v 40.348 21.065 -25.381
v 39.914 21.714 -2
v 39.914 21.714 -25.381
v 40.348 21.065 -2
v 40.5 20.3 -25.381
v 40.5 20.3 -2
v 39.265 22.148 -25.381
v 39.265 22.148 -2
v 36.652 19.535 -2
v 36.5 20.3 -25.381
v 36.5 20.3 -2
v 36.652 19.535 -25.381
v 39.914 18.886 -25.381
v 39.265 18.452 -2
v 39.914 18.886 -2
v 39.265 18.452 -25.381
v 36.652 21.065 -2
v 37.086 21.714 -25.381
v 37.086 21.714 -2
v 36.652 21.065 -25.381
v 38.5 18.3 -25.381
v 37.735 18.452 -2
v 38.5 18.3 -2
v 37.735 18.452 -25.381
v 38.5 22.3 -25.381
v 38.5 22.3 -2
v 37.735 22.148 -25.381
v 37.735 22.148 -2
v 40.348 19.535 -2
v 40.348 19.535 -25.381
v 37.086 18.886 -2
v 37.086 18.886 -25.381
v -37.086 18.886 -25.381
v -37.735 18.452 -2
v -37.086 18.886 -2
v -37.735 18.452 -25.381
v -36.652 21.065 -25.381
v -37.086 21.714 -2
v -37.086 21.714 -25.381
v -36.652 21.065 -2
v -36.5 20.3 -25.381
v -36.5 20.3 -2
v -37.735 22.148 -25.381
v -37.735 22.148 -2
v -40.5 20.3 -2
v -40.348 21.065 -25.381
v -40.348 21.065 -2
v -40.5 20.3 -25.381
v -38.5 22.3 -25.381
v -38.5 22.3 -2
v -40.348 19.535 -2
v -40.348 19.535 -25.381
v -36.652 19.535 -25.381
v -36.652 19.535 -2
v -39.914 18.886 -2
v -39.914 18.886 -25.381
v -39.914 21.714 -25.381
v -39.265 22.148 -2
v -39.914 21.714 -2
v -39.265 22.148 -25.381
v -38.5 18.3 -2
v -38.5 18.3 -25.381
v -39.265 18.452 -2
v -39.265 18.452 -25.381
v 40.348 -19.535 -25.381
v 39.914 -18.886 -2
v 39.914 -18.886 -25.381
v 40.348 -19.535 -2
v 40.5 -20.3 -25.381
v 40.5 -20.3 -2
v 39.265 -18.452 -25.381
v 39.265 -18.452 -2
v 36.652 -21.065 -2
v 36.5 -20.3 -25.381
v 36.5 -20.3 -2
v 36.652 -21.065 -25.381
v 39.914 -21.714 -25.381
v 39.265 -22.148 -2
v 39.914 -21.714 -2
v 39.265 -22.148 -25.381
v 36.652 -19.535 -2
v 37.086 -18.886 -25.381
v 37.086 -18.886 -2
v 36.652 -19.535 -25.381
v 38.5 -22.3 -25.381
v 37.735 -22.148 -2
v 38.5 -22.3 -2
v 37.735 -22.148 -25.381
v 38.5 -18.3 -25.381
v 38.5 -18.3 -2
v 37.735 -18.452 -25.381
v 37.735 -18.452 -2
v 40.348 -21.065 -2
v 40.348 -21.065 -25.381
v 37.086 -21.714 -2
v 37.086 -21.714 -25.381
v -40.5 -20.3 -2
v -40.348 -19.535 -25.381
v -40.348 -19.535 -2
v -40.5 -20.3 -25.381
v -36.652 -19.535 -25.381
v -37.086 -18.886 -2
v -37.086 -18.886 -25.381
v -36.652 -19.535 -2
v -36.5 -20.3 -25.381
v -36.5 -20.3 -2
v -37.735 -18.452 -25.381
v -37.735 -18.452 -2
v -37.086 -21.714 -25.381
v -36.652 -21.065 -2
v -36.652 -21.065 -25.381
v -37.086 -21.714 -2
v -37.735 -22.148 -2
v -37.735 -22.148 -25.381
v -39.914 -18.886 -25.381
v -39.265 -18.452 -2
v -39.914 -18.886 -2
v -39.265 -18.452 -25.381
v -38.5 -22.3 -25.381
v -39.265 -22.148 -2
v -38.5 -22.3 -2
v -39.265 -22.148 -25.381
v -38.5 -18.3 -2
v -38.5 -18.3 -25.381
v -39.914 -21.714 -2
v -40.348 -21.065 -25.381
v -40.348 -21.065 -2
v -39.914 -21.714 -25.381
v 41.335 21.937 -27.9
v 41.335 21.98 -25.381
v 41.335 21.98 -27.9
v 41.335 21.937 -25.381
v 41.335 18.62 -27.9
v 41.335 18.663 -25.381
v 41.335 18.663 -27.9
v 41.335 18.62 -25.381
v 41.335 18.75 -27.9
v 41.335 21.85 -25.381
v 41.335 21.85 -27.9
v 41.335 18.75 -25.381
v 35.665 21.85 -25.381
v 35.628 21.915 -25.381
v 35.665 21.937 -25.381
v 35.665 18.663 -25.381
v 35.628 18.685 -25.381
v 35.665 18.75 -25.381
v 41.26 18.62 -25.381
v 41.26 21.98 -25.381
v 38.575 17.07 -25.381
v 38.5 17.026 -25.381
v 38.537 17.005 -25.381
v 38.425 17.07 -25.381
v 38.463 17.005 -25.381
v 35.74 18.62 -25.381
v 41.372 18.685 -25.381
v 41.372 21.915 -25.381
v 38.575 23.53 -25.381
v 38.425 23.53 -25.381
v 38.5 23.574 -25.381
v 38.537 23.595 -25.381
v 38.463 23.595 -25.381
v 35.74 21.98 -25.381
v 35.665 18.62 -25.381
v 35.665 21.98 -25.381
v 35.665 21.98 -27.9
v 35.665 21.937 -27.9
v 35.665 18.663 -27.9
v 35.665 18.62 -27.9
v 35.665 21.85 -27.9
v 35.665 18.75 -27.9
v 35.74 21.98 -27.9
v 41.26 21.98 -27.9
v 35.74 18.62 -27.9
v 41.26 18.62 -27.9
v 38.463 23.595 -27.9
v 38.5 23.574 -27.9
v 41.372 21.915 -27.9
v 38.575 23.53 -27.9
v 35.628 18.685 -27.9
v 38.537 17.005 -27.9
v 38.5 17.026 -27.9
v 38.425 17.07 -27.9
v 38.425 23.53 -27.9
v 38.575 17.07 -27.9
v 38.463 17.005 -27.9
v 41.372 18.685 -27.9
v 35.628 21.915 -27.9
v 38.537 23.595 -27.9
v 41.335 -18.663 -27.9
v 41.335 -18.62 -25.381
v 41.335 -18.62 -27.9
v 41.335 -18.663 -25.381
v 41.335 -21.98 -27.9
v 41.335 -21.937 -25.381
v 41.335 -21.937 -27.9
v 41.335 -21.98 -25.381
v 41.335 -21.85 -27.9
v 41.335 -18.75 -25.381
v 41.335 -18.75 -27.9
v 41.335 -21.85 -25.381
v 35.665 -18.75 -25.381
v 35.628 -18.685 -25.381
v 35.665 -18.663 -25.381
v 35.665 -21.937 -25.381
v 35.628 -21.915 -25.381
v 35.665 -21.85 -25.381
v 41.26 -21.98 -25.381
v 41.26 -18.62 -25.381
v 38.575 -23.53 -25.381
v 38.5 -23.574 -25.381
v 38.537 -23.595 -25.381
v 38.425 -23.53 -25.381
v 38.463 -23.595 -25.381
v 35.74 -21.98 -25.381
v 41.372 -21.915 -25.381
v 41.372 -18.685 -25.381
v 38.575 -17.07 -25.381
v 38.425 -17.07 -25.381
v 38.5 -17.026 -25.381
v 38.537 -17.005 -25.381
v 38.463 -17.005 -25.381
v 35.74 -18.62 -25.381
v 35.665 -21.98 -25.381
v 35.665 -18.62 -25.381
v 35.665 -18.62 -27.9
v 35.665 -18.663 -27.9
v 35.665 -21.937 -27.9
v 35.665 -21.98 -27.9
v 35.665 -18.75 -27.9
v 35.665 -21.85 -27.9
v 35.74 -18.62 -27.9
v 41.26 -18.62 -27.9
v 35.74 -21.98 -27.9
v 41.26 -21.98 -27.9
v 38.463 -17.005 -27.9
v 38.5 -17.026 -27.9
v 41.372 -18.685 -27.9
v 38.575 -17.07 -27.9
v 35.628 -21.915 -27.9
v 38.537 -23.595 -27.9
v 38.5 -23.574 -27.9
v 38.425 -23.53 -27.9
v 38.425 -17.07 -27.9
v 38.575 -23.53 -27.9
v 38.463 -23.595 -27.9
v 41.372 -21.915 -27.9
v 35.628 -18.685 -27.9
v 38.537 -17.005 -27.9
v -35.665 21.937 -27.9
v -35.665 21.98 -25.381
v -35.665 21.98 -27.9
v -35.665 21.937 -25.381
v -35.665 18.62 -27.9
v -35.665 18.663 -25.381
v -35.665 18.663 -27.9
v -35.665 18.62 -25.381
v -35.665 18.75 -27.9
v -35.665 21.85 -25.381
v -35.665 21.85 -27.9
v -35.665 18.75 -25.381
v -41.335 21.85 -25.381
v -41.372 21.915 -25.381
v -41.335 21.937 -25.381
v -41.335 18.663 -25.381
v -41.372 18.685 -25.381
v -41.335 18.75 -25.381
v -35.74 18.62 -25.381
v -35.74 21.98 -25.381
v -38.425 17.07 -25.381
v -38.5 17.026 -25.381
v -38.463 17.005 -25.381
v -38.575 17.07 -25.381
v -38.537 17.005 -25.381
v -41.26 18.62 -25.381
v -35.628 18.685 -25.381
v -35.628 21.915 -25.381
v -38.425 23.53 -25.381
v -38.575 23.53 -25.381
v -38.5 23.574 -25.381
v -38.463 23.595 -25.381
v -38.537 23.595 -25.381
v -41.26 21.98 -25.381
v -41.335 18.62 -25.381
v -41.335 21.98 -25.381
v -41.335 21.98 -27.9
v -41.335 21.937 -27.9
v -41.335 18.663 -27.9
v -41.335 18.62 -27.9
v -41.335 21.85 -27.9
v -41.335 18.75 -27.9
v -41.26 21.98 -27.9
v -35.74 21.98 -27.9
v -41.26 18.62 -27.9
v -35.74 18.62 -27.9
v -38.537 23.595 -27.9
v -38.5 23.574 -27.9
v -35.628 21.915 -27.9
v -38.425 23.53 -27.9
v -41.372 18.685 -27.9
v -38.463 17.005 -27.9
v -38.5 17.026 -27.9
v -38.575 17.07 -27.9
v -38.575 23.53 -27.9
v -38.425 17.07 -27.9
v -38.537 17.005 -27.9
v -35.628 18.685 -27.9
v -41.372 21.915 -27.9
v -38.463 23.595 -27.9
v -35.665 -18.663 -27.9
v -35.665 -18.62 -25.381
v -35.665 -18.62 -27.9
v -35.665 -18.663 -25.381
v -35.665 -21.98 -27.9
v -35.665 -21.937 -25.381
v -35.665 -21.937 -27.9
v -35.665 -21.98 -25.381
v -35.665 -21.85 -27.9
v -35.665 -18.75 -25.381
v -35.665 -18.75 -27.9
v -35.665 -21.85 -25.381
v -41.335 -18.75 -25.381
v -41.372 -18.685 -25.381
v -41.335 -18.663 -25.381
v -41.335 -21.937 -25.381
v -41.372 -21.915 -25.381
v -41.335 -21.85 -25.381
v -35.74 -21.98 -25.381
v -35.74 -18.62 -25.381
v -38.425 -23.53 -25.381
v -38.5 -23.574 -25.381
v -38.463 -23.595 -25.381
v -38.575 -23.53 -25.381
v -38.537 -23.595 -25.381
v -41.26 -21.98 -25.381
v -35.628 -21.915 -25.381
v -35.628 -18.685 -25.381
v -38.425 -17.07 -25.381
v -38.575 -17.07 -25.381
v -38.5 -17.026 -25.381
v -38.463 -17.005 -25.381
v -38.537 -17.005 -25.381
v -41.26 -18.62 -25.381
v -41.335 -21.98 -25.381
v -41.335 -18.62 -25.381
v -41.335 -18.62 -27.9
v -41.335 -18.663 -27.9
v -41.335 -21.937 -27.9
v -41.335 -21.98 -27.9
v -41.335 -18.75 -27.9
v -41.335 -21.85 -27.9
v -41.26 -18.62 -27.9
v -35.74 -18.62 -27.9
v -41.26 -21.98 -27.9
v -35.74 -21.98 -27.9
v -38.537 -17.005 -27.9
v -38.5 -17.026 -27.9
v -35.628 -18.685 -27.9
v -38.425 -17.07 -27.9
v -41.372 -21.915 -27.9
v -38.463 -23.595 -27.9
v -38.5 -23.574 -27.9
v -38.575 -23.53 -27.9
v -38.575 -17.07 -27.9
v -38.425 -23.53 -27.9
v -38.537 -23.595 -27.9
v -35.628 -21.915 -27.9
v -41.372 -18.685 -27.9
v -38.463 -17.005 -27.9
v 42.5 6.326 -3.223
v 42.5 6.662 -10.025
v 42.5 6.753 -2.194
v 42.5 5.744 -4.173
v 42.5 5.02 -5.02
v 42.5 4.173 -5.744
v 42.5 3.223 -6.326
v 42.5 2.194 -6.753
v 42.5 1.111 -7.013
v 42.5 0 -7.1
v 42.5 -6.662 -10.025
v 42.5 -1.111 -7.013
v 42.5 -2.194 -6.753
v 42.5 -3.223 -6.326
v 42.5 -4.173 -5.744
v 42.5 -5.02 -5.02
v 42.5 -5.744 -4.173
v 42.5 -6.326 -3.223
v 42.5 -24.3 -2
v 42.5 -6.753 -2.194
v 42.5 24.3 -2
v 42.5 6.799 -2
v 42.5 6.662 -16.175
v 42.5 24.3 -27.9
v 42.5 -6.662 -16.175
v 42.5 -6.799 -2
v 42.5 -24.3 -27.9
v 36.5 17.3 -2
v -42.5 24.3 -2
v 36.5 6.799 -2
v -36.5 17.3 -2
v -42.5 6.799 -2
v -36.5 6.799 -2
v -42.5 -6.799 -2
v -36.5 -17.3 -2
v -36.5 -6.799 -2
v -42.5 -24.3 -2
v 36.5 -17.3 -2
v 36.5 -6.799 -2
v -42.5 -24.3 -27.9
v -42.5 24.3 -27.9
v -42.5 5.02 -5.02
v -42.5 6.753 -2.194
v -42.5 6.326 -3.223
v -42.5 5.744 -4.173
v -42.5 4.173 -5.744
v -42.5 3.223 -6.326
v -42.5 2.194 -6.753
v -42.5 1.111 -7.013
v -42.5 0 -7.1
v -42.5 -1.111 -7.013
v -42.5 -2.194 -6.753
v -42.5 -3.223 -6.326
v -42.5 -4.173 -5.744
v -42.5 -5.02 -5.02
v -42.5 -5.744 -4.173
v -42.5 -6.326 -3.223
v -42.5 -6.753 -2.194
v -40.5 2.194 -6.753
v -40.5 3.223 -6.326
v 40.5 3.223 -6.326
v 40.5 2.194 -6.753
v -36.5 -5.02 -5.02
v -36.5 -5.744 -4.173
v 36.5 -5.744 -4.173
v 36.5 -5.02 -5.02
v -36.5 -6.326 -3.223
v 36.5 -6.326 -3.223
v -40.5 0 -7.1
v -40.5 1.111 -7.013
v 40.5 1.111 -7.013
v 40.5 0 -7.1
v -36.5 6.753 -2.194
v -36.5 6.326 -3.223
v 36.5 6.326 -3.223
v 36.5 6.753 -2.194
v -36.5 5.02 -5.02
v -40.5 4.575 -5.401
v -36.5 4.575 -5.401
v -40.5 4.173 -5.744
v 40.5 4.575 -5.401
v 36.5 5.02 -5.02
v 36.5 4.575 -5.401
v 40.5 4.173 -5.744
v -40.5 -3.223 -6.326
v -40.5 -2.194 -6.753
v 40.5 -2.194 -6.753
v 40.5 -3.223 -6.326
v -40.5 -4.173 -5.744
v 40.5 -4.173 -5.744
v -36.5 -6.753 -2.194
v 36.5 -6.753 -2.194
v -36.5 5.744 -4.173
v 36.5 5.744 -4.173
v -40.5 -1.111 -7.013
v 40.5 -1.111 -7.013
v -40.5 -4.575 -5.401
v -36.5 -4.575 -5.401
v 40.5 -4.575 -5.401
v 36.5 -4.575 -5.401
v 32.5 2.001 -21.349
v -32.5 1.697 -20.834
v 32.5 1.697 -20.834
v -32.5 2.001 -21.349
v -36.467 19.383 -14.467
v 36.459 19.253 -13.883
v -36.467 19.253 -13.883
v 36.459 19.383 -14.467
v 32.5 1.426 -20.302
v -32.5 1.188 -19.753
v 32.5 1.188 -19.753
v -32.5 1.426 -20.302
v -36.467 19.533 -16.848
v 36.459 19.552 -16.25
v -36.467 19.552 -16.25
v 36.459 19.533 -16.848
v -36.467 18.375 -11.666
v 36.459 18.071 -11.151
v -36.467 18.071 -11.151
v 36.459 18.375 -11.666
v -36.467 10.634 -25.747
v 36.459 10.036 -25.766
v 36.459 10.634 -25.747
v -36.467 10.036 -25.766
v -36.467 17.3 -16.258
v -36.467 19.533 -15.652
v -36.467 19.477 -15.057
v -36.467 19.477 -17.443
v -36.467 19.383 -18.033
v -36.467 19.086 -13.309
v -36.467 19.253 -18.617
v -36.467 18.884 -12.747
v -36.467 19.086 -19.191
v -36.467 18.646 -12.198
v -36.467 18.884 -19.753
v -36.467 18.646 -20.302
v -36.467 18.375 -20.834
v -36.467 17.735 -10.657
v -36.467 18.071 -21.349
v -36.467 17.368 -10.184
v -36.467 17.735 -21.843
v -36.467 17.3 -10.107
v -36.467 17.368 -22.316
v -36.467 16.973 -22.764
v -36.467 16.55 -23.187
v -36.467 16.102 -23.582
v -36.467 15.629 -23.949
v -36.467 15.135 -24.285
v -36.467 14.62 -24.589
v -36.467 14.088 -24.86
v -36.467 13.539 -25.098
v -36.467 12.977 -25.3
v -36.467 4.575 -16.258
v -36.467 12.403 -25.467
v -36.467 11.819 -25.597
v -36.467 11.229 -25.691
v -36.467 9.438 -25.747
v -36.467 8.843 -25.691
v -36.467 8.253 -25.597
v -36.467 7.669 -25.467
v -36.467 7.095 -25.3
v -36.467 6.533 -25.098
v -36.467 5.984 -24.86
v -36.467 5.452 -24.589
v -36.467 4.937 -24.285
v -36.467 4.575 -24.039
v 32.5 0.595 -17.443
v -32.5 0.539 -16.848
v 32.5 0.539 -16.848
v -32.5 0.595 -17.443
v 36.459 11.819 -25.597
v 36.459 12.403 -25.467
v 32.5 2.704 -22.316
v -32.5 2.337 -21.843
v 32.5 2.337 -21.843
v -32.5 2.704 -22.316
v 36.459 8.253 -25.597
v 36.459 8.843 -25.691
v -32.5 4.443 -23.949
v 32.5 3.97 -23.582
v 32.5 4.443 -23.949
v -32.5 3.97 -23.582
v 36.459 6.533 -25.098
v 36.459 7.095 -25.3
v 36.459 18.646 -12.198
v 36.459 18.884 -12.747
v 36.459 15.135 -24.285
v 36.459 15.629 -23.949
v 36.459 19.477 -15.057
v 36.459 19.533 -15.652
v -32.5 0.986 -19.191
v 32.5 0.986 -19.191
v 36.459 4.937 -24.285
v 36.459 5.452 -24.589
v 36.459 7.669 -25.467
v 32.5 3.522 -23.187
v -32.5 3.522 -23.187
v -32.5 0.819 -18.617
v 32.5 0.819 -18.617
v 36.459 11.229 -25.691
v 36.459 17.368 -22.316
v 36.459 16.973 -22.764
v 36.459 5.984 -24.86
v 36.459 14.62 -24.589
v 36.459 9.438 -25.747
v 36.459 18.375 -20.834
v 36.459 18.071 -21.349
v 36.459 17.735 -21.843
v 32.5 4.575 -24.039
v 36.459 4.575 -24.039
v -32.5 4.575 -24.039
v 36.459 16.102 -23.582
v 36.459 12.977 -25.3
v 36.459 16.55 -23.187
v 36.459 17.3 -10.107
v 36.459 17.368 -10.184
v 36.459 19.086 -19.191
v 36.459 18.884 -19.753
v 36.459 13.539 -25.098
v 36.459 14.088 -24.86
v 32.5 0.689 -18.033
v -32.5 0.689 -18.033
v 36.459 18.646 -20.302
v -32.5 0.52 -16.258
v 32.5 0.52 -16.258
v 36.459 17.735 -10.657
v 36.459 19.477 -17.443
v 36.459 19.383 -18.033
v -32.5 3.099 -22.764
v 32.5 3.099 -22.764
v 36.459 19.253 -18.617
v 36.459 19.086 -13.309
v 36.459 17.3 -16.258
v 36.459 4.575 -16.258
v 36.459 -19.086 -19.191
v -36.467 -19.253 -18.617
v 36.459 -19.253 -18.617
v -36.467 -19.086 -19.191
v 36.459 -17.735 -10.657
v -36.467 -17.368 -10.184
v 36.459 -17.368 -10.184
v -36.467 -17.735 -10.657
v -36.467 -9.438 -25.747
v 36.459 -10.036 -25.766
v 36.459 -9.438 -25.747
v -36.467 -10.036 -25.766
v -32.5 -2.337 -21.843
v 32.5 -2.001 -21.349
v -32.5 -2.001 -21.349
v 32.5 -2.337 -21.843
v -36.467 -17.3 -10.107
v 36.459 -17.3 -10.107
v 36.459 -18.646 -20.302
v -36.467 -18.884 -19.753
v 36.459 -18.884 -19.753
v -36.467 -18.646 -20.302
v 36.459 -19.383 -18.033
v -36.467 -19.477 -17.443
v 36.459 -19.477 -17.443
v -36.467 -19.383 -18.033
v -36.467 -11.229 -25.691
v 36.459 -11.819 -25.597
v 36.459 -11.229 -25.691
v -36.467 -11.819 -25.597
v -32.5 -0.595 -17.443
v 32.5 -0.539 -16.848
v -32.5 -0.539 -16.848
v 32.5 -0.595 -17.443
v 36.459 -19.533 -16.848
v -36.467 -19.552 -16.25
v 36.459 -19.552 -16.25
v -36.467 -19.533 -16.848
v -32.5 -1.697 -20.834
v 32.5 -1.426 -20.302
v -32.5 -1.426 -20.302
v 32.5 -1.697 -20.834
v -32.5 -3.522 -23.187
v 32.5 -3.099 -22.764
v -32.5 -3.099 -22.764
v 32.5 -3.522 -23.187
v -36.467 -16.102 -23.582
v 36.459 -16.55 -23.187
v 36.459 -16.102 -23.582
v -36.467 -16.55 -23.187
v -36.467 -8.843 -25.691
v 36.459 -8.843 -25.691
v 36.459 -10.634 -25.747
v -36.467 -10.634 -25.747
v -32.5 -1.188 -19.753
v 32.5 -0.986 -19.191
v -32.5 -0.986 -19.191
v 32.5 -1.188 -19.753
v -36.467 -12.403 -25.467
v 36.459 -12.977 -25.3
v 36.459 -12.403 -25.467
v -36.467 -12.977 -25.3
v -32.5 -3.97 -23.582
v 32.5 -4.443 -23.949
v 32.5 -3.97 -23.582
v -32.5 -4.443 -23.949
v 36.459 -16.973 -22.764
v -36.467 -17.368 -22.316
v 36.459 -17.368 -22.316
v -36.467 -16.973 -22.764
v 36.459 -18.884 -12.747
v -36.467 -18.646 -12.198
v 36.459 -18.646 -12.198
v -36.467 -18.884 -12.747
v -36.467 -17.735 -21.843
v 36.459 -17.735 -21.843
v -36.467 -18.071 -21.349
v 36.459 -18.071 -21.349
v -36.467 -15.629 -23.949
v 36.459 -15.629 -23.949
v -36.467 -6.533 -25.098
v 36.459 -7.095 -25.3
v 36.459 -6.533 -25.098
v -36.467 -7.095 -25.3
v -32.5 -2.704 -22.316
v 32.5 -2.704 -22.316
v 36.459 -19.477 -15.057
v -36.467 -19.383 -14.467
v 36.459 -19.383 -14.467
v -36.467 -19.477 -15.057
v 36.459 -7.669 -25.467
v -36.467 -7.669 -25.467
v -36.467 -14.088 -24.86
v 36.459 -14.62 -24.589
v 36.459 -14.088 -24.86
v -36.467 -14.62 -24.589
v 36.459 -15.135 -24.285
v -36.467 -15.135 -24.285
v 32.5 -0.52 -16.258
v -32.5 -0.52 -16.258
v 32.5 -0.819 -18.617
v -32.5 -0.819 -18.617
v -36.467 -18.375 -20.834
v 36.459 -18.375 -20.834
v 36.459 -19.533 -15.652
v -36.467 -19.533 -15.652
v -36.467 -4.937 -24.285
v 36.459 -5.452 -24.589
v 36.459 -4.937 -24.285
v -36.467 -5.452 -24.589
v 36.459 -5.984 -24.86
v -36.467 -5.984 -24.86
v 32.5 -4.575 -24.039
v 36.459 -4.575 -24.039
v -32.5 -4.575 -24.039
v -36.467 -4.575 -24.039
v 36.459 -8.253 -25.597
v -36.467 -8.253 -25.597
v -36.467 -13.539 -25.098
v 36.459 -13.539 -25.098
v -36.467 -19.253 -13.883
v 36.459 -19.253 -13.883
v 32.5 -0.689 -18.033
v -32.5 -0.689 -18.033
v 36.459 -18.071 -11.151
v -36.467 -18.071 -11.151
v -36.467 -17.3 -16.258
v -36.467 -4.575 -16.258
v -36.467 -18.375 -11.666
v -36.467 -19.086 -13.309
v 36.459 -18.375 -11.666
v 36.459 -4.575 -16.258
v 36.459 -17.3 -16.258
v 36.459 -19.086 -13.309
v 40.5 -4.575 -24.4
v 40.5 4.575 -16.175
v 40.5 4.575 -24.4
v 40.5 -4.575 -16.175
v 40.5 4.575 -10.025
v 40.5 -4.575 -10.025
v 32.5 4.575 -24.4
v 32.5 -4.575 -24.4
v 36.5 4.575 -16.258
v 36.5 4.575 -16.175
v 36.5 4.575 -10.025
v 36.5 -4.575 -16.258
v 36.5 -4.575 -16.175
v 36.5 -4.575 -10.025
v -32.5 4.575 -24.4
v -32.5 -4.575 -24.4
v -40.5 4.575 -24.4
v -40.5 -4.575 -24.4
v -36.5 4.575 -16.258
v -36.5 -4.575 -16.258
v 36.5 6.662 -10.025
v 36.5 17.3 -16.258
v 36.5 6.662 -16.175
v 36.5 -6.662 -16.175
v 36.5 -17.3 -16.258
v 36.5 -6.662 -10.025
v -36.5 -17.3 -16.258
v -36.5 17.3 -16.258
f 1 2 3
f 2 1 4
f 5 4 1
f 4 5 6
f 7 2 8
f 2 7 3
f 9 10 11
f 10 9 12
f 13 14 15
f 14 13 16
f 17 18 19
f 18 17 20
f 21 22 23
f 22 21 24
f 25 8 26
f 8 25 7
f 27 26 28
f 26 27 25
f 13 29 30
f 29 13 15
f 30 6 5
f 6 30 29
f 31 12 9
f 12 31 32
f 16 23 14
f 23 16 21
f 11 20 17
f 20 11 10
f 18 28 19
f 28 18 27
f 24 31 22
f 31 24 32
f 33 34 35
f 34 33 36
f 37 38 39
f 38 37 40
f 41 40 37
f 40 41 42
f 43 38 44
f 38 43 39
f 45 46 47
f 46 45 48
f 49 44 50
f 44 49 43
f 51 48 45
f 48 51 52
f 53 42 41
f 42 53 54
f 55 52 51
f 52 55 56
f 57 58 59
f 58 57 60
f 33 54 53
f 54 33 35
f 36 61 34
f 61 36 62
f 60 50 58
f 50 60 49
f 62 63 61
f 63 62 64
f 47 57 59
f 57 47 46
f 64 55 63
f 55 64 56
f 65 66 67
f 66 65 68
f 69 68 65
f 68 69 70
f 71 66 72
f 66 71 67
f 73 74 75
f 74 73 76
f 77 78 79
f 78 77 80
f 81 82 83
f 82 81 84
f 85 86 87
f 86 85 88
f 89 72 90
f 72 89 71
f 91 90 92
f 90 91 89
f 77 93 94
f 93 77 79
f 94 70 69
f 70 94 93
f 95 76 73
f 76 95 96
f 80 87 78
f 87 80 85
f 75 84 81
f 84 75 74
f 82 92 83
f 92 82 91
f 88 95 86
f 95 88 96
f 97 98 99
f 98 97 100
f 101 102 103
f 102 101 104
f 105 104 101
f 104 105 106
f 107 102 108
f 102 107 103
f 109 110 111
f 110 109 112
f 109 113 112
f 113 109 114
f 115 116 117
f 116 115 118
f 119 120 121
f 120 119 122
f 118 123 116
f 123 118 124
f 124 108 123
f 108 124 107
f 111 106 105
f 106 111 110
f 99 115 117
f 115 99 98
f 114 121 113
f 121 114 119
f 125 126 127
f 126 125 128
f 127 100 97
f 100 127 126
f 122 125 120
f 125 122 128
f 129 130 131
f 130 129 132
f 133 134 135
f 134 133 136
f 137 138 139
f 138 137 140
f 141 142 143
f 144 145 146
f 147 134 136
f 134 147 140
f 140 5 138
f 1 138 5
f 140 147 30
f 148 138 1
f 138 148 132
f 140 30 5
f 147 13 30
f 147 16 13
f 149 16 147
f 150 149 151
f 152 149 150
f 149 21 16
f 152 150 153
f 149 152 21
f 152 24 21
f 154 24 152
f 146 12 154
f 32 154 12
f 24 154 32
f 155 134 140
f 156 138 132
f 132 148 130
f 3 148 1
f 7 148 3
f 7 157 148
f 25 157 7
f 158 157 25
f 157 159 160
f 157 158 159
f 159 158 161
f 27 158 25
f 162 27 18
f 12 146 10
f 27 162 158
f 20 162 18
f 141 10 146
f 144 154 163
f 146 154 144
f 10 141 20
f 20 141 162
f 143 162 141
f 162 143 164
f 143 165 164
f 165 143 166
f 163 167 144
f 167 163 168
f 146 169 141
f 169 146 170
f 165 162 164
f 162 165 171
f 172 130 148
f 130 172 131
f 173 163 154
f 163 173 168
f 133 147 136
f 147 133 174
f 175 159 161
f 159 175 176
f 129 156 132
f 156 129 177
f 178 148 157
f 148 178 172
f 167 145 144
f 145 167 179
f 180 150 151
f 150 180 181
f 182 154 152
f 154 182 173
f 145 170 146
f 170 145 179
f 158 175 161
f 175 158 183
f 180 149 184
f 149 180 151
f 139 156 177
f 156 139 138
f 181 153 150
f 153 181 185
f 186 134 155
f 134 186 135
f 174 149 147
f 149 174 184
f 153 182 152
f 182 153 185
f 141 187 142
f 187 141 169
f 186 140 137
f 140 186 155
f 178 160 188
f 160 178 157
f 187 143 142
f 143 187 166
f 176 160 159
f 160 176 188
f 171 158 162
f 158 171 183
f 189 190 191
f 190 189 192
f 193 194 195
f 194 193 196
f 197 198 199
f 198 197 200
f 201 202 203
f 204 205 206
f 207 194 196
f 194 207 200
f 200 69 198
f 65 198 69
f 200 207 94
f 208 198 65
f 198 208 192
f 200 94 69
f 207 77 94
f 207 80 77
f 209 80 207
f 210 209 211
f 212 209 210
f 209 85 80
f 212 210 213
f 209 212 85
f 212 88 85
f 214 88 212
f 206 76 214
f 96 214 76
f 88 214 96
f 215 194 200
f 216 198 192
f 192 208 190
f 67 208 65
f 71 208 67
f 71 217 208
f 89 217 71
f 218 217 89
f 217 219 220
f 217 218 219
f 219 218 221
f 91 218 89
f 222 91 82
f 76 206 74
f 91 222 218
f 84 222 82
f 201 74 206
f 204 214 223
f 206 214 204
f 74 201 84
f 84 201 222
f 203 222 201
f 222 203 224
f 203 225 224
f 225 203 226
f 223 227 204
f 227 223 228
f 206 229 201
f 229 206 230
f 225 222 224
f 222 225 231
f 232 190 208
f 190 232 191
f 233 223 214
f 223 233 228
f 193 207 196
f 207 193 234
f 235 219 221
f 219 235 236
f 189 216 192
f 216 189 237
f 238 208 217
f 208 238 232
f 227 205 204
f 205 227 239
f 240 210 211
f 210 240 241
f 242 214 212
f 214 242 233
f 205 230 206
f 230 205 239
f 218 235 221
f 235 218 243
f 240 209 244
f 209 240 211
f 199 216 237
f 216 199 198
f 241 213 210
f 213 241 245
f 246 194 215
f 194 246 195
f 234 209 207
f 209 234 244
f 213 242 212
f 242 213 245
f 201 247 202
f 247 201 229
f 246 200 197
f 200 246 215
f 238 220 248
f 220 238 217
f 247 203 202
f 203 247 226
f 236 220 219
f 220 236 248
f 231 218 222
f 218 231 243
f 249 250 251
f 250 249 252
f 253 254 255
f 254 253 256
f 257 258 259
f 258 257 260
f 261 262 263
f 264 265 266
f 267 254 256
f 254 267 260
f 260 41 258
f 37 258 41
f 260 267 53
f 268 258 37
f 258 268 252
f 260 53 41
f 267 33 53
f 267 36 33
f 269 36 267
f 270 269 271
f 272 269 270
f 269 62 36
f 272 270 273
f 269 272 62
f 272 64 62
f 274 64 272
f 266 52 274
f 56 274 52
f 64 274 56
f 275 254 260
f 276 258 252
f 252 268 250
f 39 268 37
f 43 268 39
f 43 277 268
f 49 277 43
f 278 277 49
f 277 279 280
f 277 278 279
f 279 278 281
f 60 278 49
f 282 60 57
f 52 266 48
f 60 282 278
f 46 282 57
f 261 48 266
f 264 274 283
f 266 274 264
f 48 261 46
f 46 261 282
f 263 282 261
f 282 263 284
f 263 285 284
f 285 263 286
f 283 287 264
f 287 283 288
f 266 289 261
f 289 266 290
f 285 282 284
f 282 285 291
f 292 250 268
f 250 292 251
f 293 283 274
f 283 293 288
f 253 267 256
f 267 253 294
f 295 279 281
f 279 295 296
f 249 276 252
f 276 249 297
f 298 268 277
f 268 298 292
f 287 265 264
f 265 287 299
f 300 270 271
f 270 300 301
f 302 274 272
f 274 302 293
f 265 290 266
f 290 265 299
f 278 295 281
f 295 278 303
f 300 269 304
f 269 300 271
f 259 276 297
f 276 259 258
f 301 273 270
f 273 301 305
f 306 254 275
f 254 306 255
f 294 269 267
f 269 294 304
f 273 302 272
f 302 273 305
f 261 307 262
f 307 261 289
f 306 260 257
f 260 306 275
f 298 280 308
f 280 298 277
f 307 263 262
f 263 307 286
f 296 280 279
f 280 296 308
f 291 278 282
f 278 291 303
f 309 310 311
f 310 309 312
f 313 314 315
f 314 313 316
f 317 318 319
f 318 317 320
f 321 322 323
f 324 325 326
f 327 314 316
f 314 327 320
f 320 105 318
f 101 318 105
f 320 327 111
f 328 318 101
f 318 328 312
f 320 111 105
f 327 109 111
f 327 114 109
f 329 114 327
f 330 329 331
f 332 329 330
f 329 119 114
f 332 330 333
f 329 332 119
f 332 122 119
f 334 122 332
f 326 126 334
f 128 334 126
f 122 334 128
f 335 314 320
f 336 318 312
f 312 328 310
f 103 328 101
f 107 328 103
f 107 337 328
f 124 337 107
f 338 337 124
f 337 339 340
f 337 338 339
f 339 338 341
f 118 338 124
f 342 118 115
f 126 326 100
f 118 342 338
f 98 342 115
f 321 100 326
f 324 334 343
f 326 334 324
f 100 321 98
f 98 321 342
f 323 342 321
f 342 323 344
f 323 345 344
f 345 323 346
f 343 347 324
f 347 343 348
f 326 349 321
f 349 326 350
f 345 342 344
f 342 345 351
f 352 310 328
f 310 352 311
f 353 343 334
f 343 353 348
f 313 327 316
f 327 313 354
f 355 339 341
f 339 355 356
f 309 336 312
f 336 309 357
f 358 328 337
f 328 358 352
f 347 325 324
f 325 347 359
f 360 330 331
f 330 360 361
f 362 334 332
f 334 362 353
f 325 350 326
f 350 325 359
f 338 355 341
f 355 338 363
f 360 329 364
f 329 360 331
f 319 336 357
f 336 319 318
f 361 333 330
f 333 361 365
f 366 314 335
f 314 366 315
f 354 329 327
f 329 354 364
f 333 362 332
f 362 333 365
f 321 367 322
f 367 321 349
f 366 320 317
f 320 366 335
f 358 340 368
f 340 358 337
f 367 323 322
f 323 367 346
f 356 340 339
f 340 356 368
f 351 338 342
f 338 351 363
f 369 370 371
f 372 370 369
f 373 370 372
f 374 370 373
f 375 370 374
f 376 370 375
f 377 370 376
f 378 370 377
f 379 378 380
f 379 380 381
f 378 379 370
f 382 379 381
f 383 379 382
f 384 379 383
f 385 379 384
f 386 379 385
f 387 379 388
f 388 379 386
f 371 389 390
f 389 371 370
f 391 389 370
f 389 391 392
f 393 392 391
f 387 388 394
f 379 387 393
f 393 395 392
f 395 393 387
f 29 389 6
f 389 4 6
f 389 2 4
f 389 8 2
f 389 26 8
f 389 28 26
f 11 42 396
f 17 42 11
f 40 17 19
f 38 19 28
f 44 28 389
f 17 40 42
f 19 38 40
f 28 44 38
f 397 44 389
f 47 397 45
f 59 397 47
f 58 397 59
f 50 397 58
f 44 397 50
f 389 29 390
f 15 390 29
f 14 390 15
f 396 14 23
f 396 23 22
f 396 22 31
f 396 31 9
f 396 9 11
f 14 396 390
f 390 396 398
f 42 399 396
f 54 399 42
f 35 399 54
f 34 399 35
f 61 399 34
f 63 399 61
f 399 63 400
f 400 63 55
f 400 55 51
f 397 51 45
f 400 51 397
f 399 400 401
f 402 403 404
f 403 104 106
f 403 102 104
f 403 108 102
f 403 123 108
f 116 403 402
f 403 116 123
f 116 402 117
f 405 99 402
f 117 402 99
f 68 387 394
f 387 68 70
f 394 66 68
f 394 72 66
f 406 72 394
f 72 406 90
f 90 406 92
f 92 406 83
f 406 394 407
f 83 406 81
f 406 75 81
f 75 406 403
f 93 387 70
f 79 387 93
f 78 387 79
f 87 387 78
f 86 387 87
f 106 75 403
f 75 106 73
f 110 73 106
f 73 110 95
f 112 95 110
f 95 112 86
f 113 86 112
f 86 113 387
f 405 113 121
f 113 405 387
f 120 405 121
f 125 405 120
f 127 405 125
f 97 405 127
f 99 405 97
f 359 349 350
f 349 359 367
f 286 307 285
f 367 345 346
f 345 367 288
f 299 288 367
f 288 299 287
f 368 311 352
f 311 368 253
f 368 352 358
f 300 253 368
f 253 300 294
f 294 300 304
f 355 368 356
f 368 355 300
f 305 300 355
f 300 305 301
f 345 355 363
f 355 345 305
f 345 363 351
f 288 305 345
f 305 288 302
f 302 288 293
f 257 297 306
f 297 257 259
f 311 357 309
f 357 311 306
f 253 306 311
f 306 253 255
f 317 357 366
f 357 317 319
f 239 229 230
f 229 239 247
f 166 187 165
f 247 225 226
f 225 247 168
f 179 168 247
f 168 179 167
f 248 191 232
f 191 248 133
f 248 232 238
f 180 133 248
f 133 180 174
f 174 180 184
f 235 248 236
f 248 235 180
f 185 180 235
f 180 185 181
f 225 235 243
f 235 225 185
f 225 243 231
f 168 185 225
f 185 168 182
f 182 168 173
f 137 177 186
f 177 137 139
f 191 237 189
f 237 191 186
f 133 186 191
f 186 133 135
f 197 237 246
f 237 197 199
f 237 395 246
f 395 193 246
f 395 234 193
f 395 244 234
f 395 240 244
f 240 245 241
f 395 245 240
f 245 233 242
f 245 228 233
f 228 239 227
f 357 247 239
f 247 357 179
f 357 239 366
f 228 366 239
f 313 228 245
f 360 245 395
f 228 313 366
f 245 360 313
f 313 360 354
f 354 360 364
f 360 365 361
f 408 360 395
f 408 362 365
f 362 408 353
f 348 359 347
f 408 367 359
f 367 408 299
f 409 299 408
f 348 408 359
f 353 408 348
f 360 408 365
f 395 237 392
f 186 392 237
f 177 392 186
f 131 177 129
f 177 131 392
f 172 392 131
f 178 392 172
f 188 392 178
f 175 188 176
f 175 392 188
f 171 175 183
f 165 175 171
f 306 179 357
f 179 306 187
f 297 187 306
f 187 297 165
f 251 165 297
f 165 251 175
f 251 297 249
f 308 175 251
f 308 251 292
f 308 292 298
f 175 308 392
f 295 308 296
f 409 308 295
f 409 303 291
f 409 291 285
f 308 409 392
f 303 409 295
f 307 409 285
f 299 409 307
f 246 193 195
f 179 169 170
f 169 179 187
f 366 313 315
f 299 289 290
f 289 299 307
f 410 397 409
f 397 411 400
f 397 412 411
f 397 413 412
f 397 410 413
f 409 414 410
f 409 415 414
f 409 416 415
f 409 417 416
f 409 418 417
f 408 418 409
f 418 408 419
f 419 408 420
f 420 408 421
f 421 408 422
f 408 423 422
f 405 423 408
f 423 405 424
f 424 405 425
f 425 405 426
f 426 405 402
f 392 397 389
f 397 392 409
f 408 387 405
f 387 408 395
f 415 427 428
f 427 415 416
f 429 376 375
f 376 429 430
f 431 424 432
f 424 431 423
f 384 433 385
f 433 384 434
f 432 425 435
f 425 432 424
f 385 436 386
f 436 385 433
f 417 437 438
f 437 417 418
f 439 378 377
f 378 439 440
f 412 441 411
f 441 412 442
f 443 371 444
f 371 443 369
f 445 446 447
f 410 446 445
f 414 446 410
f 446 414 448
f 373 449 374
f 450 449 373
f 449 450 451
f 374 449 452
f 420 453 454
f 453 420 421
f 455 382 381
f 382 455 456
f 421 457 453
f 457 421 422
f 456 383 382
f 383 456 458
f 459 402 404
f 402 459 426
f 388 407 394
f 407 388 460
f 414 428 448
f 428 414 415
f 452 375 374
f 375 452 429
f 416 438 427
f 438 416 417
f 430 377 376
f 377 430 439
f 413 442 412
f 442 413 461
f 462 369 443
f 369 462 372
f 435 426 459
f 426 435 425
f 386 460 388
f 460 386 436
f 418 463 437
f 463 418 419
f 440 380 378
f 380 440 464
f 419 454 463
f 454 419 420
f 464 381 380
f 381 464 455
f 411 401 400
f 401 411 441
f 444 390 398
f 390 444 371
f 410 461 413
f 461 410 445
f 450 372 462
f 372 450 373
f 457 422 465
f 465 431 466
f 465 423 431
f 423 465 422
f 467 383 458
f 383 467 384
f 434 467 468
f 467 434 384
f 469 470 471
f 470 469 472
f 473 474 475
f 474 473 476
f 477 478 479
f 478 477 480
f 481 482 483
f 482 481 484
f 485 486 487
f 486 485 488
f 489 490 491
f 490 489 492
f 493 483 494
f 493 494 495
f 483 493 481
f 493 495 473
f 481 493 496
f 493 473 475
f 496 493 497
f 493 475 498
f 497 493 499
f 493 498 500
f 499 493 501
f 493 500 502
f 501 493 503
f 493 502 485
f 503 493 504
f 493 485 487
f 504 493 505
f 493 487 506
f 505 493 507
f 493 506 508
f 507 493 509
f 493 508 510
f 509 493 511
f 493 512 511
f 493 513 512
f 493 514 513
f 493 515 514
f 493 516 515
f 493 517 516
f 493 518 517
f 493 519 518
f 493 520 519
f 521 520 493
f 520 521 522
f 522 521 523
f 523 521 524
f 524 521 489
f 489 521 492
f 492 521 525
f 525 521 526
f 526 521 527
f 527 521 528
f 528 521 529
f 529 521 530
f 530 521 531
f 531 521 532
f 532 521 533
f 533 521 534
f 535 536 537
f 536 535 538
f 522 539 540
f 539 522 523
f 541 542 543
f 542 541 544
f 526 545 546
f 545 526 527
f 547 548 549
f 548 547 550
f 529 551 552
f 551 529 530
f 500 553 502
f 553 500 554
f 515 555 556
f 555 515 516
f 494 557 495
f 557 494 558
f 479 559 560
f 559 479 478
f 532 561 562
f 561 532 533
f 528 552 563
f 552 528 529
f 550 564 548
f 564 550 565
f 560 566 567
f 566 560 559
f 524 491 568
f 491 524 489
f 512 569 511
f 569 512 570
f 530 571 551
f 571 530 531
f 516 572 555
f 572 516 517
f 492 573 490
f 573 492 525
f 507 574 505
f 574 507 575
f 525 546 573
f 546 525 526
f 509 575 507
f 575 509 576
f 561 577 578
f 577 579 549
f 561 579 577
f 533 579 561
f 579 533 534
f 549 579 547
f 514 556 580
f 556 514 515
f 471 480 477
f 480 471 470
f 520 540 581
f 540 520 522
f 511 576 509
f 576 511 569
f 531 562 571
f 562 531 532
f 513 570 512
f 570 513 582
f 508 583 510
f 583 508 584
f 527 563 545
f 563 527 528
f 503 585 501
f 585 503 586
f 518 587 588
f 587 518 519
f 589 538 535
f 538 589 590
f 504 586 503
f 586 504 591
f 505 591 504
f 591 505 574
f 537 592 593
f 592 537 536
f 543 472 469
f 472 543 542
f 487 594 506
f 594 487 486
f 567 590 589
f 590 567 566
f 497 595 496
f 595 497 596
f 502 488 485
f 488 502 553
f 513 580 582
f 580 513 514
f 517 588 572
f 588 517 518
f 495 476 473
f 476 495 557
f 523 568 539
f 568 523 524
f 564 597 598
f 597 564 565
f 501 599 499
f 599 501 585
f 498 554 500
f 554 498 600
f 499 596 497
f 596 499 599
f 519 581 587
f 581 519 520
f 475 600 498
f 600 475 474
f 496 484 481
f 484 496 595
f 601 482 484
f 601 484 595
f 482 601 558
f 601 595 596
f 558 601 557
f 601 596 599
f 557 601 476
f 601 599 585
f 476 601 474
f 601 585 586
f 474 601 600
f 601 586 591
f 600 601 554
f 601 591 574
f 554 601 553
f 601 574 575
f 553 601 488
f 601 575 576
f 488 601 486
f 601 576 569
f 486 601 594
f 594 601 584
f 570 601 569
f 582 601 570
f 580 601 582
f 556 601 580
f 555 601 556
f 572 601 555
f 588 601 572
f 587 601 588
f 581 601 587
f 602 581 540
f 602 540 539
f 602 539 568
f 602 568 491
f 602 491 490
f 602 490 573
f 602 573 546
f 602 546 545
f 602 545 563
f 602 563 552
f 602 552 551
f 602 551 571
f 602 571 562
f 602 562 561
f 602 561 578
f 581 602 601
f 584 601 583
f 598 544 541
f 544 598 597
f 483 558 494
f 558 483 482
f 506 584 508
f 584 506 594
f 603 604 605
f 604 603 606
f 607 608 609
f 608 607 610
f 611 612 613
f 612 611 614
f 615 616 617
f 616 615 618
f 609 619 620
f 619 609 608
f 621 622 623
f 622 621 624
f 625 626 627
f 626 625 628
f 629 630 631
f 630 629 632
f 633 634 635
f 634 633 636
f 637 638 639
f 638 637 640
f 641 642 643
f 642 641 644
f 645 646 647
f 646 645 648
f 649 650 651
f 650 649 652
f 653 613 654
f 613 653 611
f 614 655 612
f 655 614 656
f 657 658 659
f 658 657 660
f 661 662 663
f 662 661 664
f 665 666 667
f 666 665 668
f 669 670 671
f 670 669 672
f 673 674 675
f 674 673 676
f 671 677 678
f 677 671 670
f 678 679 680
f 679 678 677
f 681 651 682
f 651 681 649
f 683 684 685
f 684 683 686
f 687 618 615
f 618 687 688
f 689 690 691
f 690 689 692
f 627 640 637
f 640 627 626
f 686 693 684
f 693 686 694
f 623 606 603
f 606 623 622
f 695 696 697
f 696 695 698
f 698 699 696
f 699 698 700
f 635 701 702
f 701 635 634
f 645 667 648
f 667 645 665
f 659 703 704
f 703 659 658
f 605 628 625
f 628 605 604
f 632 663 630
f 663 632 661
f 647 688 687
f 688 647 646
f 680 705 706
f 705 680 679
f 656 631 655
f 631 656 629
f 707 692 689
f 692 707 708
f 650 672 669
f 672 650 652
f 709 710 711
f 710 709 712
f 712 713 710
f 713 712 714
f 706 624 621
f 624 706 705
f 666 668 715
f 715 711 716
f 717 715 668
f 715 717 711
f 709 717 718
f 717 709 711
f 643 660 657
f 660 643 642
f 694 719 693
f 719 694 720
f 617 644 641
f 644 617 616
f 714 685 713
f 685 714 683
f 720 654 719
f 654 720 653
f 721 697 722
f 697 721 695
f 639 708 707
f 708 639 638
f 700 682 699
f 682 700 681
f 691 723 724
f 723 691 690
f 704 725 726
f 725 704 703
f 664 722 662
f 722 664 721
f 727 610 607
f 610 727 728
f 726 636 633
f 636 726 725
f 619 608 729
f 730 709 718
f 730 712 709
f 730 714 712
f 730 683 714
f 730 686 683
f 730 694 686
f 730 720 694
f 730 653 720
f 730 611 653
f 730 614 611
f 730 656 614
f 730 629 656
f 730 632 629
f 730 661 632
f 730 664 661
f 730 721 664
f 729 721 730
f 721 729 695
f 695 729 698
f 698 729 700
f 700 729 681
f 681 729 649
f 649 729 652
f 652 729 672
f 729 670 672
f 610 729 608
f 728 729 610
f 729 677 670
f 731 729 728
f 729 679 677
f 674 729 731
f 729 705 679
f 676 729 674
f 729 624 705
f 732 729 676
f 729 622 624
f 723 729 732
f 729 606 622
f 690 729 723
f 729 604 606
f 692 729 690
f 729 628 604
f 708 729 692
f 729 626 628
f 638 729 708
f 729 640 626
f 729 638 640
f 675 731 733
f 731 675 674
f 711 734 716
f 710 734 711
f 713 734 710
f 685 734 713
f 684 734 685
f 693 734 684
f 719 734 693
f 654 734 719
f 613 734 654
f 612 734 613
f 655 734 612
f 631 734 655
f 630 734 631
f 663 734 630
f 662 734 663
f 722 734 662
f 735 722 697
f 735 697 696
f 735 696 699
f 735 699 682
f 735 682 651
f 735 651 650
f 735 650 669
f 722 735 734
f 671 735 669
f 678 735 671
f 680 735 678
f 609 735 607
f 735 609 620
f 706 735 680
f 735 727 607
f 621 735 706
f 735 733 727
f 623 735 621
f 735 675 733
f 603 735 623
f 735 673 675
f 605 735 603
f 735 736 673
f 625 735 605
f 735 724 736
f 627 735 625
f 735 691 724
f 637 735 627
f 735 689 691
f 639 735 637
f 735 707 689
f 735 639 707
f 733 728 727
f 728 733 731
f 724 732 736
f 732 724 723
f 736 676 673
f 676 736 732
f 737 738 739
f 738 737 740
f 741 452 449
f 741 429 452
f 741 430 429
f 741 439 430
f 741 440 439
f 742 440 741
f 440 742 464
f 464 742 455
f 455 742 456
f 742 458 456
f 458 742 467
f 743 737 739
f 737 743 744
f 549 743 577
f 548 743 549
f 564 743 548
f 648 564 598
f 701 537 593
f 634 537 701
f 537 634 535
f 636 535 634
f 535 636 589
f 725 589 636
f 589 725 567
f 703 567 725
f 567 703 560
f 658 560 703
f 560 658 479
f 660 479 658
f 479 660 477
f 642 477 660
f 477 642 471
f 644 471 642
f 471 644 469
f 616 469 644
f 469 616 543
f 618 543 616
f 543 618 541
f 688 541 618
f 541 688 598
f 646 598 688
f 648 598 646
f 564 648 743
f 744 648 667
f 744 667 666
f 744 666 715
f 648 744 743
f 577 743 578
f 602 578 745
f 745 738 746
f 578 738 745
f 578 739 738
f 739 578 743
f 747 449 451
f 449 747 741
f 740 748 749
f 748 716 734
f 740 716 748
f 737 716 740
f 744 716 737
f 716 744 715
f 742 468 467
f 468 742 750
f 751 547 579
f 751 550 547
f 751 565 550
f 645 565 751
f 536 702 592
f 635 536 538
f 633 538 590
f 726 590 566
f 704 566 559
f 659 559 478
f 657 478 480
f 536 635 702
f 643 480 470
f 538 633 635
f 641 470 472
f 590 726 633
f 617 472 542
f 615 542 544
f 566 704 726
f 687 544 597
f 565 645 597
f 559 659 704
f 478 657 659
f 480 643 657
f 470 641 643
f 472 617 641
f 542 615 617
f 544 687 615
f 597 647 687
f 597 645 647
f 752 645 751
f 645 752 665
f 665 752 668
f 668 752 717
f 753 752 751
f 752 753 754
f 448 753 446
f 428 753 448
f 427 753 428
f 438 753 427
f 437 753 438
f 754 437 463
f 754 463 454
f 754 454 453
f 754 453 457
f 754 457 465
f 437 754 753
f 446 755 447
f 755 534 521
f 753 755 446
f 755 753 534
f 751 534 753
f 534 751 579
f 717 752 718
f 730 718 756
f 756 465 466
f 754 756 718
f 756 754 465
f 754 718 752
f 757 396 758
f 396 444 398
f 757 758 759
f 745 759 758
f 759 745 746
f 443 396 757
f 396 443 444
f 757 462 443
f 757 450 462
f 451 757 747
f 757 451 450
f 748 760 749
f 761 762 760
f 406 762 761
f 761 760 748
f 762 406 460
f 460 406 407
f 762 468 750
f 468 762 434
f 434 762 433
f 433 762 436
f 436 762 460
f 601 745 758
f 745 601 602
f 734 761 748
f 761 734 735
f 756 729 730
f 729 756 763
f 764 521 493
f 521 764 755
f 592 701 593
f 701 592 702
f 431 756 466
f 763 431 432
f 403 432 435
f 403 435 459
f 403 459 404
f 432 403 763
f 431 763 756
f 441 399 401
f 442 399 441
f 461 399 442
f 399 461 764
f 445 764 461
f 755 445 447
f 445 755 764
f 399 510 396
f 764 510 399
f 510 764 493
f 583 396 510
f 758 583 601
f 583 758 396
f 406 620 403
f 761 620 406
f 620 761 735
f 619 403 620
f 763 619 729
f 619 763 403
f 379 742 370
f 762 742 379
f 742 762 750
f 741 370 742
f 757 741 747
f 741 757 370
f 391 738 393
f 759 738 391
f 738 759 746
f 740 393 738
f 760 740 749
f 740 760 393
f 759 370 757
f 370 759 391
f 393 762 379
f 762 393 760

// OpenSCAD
// file: bolt.scad
include <variables.scad>

bolt();

module bolt() {
	color("Silver")
	union() {
		for (i = [0:2]) {
			rotate([0, 0, 180/3*i])
			cube([boltWidth, boltSegmentWidth, boltHeight],center=true);
		}
	}
}
// file: switch.scad
include <variables.scad>

translate([0, -10, 0])
switch();
translate([0, 10, 0])
switch_alt();

module switch() {
	translate([-SwitchCylinderLength, 0, 0]) {
		translate([-SwitchBaseLength/2, 0, 0]) {
			color("Blue")
			cube([SwitchBaseLength, SwitchBaseWidth, SwitchBaseHeight], center=true);
			translate([-6, 0, 0])
			cube([SwitchLegLength, 0.75, 2], center=true);
			translate([-6, 4, 0])
			cube([SwitchLegLength, 0.75, 2], center=true);
			translate([-6, -4, 0])
			cube([SwitchLegLength, 0.75, 2], center=true);
		}
		rotate([0, 90, 0]) {
			cylinder(SwitchCylinderLength, r=SwitchCylinderRadius, center=false, $fn=20);
			translate([0, 0, SwitchCylinderLength])
			cylinder(10, r1=2.5/2, r2=3/2, center=false, $fn=20);
		}
	}
}

module switch_alt() {

	// SwitchAltWidth = 13;
	// SwitchAltHeight = 6;
	// SwitchAltDepth = 6;
	// SwitchPinLength = 4;
	// SwitchAltFlipperHeight = 7;
	cube([SwitchAltDepth,SwitchAltWidth, SwitchAltHeight], center=true);
}
// file: box.scad
include <variables.scad>
use <bolt.scad>

CylinderPunchedBox(MaxLength, MinWidth, stickRadius-boxSpacing/2+batteryRadius*2+minEdgeWidth, holeRadius, holeRadius*2, true);

module HoledBox(length, width, height, holeRadius, holePadding, NutIndents) {
	difference() {
		cube([length, width, height], center = true);
		
		scale([1,1,1.001])
		union() { // subtractions
			// holes
			translate([
				 (length-holePadding-holeRadius*2)/2, 
				 (width-holePadding-holeRadius*2)/2, 
				-(height)/2])
			cylinder(height+.1, r=holeRadius, $fn=16);
			translate([
				-(length-holePadding-holeRadius*2)/2, 
				 (width-holePadding-holeRadius*2)/2, 
				-(height)/2])
			cylinder(height+.1, r=holeRadius, $fn=16);
			translate([
				 (length-holePadding-holeRadius*2)/2, 
				-(width-holePadding-holeRadius*2)/2, 
				-(height)/2])
			cylinder(height+.1, r=holeRadius, $fn=16);
			translate([
				-(length-holePadding-holeRadius*2)/2, 
				-(width-holePadding-holeRadius*2)/2, 
				-(height)/2])
			cylinder(height+.1, r=holeRadius, $fn=16);
		}

		if(NutIndents) {
			translate([0, 0, -(height-boltHeight+0.001)/2]) {
				translate([(length-holePadding-holeRadius*2)/2, (width-holePadding-holeRadius*2)/2, ])
				scale([1.05, 1.05, 1.1])
				bolt();
				translate([(length-holePadding-holeRadius*2)/2, -(width-holePadding-holeRadius*2)/2, ])
				scale([1.05, 1.05, 1.1])
				bolt();
				translate([-(length-holePadding-holeRadius*2)/2, (width-holePadding-holeRadius*2)/2, ])
				scale([1.05, 1.05, 1.1])
				bolt();
				translate([-(length-holePadding-holeRadius*2)/2, -(width-holePadding-holeRadius*2)/2, ])
				scale([1.05, 1.05, 1.1])
				bolt();
			}
		}
	}
}

module CylinderPunchedBox(length, width, height, holeRadius, holePadding, NutIndents) {
	difference() {
		translate([0, 0, -(height+boxSpacing)/2])
		HoledBox(length, width, height, holeRadius, holePadding, NutIndents);

		scale([1.001, 1, 1])
		rotate([0, 90, 0])
		cylinder((length), r=stickRadius, center=true, $fn=40);
	}
}
// file: battery.scad
include <variables.scad>

module batteries() {
	color("Crimson") {
		translate([0, -batteryRadius-.1, 0])
		battery();
		translate([0, batteryRadius+.1, 0])
		battery();
	}
}

module battery() {
	rotate([0, 90, 0])
	cylinder(batteryLenght, r=batteryRadius, center=true, $fn=40);
}
// file: variables.scad
innerWidth = 38;
innerLength = 80;
innerHeight = 25;
minEdgeWidth = 2.5;
largeEdgeWidth = 6;
holeRadius = 2;
boxSpacing = 4;
stickRadius = 7.1; // fixed by table

sensorScrewHoleRadius = 2.5/2;

// PCBVariables
	PCBWidth = 35.2;
	PCBBoardLength = 70;
	PCBLength = 80;// 70;
	PCBHeight = 1.5;
	PCBBoardToBoardHeight = 13.9; // height of the two layers of pcb and the pinheaders between them
	
	PCBToBottomSpacing = 3; // space for wires on bottom of PCB
	PCBToTopSpacing = 2; // Air gap between pcb components and stick
	PCBNotchWidth = 1.5; // user definable
	PCBComponentsHeight = 17.1-PCBBoardToBoardHeight; // Height of pCB components on top of top layer pcb

	PCBSensorBoardLength = 15.75;
	PCBSensorBoardWidth = 21;
	PCBSensorBoardOverhang = 7.4; // The length of sensor board that overhangs the main print board
	PCBSensorBoardYOffset = -1.5/2;
	PCBSensorBoardHoleRadius = 1.5;
	PCBSensorBoardHoleCenterYDistance = 12.3+PCBSensorBoardHoleRadius*2;

// BatteryBoxVariables
	batteryRadius = 18.3/2;
	batteryLenght = 65;

// Bolts
	boltHeight = 2.4;
	boltWidth = 5.4;
	boltSegmentWidth = 3.2;

// Switch
	SwitchBaseLength = 9.8;
	SwitchBaseWidth = 13.1;
	SwitchBaseHeight = 8;

	SwitchCylinderRadius = 6/2;
	SwitchCylinderLength = 9;
	SwitchLegLength = 4;

// switch_alt
	SwitchAltWidth = 13;
	SwitchAltHeight = 6;
	SwitchAltDepth = 6;
	SwitchPinLength = 4;
	SwitchAltFlipperHeight = 7;


MaxLength = 85; // fixed by table
MinWidth = max(batteryRadius*4, PCBWidth)+2*largeEdgeWidth;
MinHeight = max(batteryRadius*2, PCBToTopSpacing+PCBComponentsHeight+PCBBoardToBoardHeight+PCBToBottomSpacing)+stickRadius+minEdgeWidth;
// main file
include <variables.scad>
use <battery.scad>
use <box.scad>
use <switch.scad>

batteryBoxV2();

module batteryBoxV2() {
	// color(alpha=.4)

	// translate([0, 0, -(batteryRadius+stickRadius/2)])
	// batteries();

	// insetDepth = 7.5;
	insetDepth = 8;
	difference() {
		difference() {
			// Minimum height box
			CylinderPunchedBox(MaxLength, MinWidth, stickRadius-boxSpacing/2+batteryRadius*2+minEdgeWidth, holeRadius, holeRadius*2, true);
			// Symetric height box
			// CylinderPunchedBox(MaxLength, MinWidth, MinHeight, holeRadius, holeRadius*2);
			
			
			color("Red")
			// translate([30, 0, 0])
			translate([-insetDepth/2, 0, -(stickRadius+batteryRadius)])
			scale([0.999, 1.04, 1.04]) {
				translate([-batteryLenght/2, (batteryRadius+.5), 0])
				rotate([0, 90, 0])
				cylinder(h=batteryLenght+insetDepth, r=batteryRadius, $fn=100);
				translate([-batteryLenght/2, -(batteryRadius+.5), 0])
				rotate([0, 90, 0])
				cylinder(h=batteryLenght+insetDepth, r=batteryRadius, $fn=100);
			}
		}
		union() {
			// big access openning
			translate([0, 0, -(batteryRadius+stickRadius)/2])
			scale([1, 1, 1.001])
			cube([batteryLenght+insetDepth, batteryRadius*4-2, batteryRadius+stickRadius], center=true);

			// inset cable tunnel
			color("Green")
			translate([0, 0, batteryRadius+stickRadius/2]) {
				translate([(batteryLenght+insetDepth)/2, 0, -(stickRadius+batteryRadius*2)+1])
				cube([insetDepth,batteryRadius, batteryRadius*2+stickRadius], center = true);
				translate([-(batteryLenght+insetDepth)/2, 0, -(stickRadius+batteryRadius*2)+1])
				cube([insetDepth,batteryRadius, batteryRadius*2+stickRadius], center = true);
			}
			
			color("Black")
			translate([MaxLength/2-SwitchAltDepth/2, 0, -(stickRadius+SwitchAltHeight/2+3)])
			scale(1.025)
			switch_alt();
		}
	}
}
